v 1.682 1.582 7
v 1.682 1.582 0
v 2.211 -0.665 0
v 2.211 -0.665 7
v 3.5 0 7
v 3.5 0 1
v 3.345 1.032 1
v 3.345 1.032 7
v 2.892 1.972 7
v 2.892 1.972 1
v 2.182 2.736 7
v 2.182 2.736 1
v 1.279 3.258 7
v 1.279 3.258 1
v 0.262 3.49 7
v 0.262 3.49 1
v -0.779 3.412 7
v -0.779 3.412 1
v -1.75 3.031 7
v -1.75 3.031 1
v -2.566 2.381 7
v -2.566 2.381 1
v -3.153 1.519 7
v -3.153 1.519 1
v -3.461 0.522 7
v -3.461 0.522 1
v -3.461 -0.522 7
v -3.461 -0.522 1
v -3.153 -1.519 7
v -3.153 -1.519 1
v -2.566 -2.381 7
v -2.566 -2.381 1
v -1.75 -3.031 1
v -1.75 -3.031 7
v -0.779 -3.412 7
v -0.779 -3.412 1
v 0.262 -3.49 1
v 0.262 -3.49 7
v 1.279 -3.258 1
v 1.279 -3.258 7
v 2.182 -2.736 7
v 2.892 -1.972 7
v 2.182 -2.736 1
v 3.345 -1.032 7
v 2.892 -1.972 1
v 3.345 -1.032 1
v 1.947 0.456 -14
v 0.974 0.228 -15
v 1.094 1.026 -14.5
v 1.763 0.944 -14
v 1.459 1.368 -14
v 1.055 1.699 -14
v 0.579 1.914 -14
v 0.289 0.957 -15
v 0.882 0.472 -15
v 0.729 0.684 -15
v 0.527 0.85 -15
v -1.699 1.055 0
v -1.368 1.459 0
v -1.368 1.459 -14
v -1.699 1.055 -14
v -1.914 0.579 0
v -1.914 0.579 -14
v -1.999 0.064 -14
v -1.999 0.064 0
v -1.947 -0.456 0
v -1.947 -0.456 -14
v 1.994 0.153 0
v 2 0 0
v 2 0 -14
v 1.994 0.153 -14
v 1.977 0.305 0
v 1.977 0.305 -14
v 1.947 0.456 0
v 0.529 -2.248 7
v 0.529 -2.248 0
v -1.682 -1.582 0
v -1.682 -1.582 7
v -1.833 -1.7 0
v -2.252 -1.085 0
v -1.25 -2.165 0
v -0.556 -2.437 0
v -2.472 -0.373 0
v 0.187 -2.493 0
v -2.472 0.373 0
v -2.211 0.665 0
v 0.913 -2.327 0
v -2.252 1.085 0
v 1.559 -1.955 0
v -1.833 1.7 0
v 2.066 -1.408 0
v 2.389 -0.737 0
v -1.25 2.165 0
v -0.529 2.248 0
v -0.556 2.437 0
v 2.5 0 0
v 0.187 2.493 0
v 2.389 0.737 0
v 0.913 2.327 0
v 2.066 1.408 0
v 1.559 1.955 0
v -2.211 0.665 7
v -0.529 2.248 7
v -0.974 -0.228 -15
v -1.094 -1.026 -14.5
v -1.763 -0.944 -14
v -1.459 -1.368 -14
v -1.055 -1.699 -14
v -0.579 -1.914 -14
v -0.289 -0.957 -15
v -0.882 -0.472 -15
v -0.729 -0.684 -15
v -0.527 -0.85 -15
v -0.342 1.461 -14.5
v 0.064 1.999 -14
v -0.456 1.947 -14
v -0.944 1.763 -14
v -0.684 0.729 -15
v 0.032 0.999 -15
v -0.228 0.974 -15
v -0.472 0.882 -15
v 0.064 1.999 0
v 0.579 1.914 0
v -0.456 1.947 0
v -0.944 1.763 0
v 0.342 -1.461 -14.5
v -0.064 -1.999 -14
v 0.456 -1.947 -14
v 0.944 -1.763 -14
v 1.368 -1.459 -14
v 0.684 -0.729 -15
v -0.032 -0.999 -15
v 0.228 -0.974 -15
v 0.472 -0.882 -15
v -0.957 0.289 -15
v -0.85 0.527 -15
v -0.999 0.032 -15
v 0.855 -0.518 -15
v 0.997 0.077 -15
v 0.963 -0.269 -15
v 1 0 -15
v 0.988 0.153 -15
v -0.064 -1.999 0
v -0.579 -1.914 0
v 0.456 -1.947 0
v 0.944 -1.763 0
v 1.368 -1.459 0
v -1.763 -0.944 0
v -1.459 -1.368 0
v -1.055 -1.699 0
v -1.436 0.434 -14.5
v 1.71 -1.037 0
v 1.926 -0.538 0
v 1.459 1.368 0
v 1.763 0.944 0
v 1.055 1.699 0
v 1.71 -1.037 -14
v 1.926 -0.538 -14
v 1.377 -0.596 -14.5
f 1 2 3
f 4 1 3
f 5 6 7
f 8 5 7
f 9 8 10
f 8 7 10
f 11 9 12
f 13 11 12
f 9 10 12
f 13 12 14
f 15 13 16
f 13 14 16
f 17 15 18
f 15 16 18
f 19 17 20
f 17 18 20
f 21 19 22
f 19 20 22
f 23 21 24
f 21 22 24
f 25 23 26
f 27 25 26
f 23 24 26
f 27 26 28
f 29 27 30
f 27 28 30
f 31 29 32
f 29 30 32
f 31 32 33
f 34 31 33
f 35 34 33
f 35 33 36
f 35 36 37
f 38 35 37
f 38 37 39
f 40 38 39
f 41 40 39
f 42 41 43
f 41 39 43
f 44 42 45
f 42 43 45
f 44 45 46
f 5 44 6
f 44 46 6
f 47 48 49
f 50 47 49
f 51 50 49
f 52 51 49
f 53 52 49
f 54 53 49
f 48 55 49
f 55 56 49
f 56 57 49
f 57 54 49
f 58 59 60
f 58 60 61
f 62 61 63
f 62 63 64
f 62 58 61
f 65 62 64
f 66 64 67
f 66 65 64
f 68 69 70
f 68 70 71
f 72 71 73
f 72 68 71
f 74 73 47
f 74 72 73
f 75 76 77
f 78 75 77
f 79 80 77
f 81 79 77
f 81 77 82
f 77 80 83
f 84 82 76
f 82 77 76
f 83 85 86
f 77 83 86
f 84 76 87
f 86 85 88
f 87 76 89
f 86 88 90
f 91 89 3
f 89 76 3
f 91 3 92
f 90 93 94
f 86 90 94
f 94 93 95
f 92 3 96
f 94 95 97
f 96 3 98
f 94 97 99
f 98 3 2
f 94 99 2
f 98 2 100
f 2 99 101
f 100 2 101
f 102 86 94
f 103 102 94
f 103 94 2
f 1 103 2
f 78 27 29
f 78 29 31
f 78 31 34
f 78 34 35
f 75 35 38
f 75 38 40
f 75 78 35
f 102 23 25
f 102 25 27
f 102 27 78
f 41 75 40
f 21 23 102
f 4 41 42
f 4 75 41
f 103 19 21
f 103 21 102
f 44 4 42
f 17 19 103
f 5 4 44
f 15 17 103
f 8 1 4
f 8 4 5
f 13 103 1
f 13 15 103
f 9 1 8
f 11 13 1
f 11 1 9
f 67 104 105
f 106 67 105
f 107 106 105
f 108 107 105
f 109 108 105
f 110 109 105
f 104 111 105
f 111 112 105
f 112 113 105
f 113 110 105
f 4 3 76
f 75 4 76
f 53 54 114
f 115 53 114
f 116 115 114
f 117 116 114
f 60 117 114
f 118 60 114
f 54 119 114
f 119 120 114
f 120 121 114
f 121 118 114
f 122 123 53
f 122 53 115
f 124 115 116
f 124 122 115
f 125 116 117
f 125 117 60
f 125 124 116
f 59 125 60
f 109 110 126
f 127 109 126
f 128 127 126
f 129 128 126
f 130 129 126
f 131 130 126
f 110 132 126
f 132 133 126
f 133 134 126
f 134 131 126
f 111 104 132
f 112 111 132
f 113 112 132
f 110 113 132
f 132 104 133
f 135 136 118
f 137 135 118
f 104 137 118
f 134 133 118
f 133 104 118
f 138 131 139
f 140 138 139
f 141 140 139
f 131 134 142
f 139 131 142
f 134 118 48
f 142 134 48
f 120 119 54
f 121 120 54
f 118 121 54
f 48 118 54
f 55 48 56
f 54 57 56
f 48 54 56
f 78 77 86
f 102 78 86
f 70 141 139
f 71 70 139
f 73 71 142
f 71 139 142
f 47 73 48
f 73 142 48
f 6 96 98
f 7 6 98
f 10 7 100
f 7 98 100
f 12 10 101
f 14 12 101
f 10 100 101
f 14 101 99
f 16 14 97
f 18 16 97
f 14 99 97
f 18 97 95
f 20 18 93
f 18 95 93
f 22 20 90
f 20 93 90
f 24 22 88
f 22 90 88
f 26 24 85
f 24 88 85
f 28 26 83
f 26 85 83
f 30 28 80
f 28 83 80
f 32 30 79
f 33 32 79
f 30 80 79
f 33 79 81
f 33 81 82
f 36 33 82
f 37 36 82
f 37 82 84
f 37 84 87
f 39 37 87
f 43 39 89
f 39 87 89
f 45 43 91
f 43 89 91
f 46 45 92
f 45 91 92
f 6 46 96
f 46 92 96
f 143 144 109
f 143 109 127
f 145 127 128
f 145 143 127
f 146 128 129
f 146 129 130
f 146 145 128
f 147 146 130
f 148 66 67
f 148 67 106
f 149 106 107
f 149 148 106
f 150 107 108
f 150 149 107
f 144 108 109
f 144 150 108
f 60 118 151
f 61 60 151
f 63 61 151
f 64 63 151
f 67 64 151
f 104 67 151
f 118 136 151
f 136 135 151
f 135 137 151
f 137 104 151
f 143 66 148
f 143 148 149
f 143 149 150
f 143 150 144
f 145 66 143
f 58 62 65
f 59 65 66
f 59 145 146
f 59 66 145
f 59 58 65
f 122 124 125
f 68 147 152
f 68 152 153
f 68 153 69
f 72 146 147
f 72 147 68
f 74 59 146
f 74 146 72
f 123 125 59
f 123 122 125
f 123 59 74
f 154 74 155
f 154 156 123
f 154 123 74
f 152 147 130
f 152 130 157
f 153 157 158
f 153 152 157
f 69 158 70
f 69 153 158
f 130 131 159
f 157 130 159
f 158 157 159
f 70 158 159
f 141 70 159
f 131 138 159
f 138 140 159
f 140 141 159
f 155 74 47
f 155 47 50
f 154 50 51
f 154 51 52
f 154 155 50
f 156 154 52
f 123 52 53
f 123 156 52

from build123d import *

# Parameters (mm, degrees)
F0_R      = 3.5
F1_DEPTH  = 7
F3_DEPTH  = 15
F4_SIZE   = 1
F4_2_SIZE = 1


with BuildPart() as f1:
    # F0 (on Top) → F1 (new body)
    with BuildSketch(Plane.XY):
        Circle(F0_R)
        Polygon((1.6820281696, 1.5824394364), (2.2114468367, -0.6654594065), (0.5294186671, -2.247898843), (-1.6820281696, -1.5824394364), (-2.2114468367, 0.6654594065), (-0.5294186671, 2.247898843), align=None, mode=Mode.SUBTRACT)
    extrude(amount=F1_DEPTH)

    # F4#2
    f4_2_edges = [f1.edges().sort_by_distance(p)[0] for p in [
        (-3.5, 0, 0),
    ]]
    chamfer(f4_2_edges, length=F4_2_SIZE)


with BuildPart() as f3:
    # F2 (on Top) → F3 (new body)
    with BuildSketch(Plane.XY):
        with BuildLine():
            ThreePointArc((2, 0), (1.9867946973, 0.2294489718), (1.9473531693, 0.4558680005))
            ThreePointArc((1.9473531693, 0.4558680005), (1.4585233241, 1.3684698437), (0.5788833421, 1.914391307))
            ThreePointArc((0.5788833421, 1.914391307), (-0.4558679991, 1.9473531697), (-1.3684698721, 1.4585232974))
            ThreePointArc((-1.3684698721, 1.4585232974), (-1.9143913204, 0.5788832978), (-1.9473531666, -0.4558680121))
            ThreePointArc((-1.9473531666, -0.4558680121), (-1.4585233203, -1.3684698478), (-0.5788833428, -1.9143913068))
            ThreePointArc((-0.5788833428, -1.9143913068), (0.4558679987, -1.9473531697), (1.3684698721, -1.4585232974))
            ThreePointArc((1.3684698721, -1.4585232974), (1.8353391709, -0.7946886987), (2, 0))
        make_face()
    extrude(amount=-F3_DEPTH)

    # F4
    f4_edges = [f3.edges().sort_by_distance(p)[0] for p in [
        (1.947353, 0.455868, -15),
    ]]
    chamfer(f4_edges, length=F4_SIZE)


solid = Compound([f1.part, f3.part])
